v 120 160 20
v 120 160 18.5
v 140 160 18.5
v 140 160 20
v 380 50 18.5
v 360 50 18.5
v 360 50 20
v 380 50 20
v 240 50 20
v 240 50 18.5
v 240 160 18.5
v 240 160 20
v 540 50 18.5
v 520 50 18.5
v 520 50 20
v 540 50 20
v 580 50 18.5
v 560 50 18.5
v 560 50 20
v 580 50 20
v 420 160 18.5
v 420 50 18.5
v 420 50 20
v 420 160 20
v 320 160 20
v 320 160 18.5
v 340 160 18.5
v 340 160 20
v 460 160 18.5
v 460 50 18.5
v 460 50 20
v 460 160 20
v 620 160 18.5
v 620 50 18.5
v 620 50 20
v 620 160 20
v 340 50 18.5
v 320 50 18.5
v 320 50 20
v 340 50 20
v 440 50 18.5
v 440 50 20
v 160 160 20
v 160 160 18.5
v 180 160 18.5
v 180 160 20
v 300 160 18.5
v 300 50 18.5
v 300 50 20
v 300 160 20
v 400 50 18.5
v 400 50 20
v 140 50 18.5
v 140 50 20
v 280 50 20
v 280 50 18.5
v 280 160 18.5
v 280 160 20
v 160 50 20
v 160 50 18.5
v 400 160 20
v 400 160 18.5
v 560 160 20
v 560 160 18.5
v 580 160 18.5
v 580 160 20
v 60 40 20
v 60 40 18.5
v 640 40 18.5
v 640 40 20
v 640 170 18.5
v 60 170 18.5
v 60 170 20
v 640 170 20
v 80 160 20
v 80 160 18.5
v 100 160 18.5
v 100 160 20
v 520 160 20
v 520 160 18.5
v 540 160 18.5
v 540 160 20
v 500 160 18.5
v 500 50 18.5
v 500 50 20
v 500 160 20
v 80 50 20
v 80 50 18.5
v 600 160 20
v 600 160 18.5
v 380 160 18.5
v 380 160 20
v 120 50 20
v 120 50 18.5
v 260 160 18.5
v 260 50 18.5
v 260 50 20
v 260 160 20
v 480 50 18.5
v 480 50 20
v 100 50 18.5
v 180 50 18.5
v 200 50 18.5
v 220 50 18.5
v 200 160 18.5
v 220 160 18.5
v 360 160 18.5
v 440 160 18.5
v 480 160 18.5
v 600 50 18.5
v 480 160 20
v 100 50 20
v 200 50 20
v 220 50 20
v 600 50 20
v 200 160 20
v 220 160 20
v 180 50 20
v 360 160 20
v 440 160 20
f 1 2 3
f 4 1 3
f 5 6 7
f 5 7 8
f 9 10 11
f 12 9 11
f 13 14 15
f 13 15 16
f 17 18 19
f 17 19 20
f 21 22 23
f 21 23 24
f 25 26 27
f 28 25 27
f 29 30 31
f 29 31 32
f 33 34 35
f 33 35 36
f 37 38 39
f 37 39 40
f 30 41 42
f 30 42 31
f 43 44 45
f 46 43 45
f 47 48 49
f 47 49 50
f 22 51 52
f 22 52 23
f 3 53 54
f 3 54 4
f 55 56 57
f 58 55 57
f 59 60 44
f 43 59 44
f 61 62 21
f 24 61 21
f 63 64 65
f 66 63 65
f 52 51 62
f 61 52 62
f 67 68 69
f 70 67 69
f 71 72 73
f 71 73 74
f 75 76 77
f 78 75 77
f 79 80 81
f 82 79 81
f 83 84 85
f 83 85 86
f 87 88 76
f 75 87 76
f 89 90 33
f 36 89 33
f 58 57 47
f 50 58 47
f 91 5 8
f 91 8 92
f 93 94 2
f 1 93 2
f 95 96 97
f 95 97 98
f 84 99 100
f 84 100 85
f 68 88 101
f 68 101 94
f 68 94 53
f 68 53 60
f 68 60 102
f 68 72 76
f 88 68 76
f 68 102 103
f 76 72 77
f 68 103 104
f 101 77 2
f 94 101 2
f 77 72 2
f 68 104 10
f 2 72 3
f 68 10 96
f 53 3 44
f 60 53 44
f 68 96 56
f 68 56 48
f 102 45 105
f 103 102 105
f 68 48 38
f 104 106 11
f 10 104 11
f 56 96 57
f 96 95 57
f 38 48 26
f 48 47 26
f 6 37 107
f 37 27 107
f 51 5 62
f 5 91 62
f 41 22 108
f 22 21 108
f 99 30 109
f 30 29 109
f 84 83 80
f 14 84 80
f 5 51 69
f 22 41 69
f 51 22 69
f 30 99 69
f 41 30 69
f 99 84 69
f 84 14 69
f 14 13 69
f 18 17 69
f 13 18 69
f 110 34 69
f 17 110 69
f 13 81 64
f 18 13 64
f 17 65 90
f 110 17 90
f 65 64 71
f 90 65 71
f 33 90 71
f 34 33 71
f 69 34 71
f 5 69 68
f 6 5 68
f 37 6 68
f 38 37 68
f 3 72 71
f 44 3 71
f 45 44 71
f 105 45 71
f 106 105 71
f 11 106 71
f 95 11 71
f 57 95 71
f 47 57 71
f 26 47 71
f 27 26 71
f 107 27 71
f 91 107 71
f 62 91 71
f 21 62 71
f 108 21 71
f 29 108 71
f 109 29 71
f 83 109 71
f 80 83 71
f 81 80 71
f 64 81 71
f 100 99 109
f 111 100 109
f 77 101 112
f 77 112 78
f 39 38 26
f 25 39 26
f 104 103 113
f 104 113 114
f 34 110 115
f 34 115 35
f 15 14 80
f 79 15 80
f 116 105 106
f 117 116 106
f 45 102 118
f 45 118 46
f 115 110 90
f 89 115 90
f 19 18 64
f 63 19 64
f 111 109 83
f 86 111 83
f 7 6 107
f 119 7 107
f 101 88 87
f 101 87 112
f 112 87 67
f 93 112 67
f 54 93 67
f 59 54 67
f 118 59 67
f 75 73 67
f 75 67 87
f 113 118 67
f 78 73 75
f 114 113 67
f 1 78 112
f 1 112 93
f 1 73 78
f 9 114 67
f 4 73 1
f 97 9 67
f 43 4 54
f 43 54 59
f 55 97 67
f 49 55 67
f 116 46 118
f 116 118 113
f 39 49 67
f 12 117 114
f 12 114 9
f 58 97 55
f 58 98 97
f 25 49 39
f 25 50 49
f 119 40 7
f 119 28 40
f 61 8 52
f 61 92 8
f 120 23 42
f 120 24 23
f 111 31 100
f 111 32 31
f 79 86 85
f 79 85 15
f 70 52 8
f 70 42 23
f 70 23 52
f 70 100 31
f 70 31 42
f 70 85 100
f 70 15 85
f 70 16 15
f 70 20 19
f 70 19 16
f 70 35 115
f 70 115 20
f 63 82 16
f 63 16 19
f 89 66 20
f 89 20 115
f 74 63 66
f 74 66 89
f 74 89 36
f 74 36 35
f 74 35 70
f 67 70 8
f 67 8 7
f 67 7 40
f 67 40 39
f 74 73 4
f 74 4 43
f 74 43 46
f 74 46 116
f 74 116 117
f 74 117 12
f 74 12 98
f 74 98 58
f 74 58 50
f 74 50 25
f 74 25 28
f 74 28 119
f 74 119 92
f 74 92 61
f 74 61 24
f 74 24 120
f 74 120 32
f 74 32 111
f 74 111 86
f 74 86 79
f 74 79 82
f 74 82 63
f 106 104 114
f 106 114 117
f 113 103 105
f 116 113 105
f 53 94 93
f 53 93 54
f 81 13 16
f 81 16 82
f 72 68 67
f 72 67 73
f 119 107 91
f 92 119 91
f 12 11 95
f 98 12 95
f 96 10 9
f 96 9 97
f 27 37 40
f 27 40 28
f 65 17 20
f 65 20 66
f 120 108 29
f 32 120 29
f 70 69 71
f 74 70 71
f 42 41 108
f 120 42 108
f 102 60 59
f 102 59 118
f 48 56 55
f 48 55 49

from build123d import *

# Parameters (mm, degrees)
TOPPING_PLINT_IZGARA_PANELI_1_START  = 18.5
SKETCH1_W                            = 580
SKETCH1_H                            = 130
TOPPING_PLINT_IZGARA_PANELI_1_DEPTH  = 1.5
TOPPING_PLINT_IZGARA_PANELI_2_START  = 17
SKETCH2_W                            = 20
SKETCH2_H                            = 110
TOPPING_PLINT_IZGARA_PANELI_2_DEPTH  = 4
TOPPING_PLINT_IZGARA_PANELI_3_START  = 17
SKETCH3_W                            = 20
SKETCH3_H                            = 110
TOPPING_PLINT_IZGARA_PANELI_3_DEPTH  = 4
TOPPING_PLINT_IZGARA_PANELI_4_START  = 17
SKETCH4_W                            = 20
SKETCH4_H                            = 110
TOPPING_PLINT_IZGARA_PANELI_4_DEPTH  = 4
TOPPING_PLINT_IZGARA_PANELI_5_START  = 17
SKETCH5_W                            = 20
SKETCH5_H                            = 110
TOPPING_PLINT_IZGARA_PANELI_5_DEPTH  = 4
TOPPING_PLINT_IZGARA_PANELI_6_START  = 17
SKETCH6_W                            = 20
SKETCH6_H                            = 110
TOPPING_PLINT_IZGARA_PANELI_6_DEPTH  = 4
TOPPING_PLINT_IZGARA_PANELI_7_START  = 17
SKETCH7_W                            = 20
SKETCH7_H                            = 110
TOPPING_PLINT_IZGARA_PANELI_7_DEPTH  = 4
TOPPING_PLINT_IZGARA_PANELI_8_START  = 17
SKETCH8_W                            = 20
SKETCH8_H                            = 110
TOPPING_PLINT_IZGARA_PANELI_8_DEPTH  = 4
TOPPING_PLINT_IZGARA_PANELI_9_START  = 17
SKETCH9_W                            = 20
SKETCH9_H                            = 110
TOPPING_PLINT_IZGARA_PANELI_9_DEPTH  = 4
TOPPING_PLINT_IZGARA_PANELI_10_START = 17
SKETCH10_W                           = 20
SKETCH10_H                           = 110
TOPPING_PLINT_IZGARA_PANELI_10_DEPTH = 4
TOPPING_PLINT_IZGARA_PANELI_11_START = 17
SKETCH11_W                           = 20
SKETCH11_H                           = 110
TOPPING_PLINT_IZGARA_PANELI_11_DEPTH = 4
TOPPING_PLINT_IZGARA_PANELI_12_START = 17
SKETCH12_W                           = 20
SKETCH12_H                           = 110
TOPPING_PLINT_IZGARA_PANELI_12_DEPTH = 4
TOPPING_PLINT_IZGARA_PANELI_13_START = 17
SKETCH13_W                           = 20
SKETCH13_H                           = 110
TOPPING_PLINT_IZGARA_PANELI_13_DEPTH = 4
TOPPING_PLINT_IZGARA_PANELI_14_START = 17
SKETCH14_W                           = 20
SKETCH14_H                           = 110
TOPPING_PLINT_IZGARA_PANELI_14_DEPTH = 4
TOPPING_PLINT_IZGARA_PANELI_15_START = 17
SKETCH15_W                           = 20
SKETCH15_H                           = 110
TOPPING_PLINT_IZGARA_PANELI_15_DEPTH = 4


with BuildPart() as part:
    # Sketch1 → TOPPING_plint_izgara_paneli_1 (new body)
    with BuildSketch(Plane.XY.offset(TOPPING_PLINT_IZGARA_PANELI_1_START)):
        with Locations((350, 105)):
            Rectangle(SKETCH1_W, SKETCH1_H)
    extrude(amount=TOPPING_PLINT_IZGARA_PANELI_1_DEPTH)

    # Sketch2 → TOPPING_plint_izgara_paneli_2 (cut)
    with BuildSketch(Plane.XY.offset(TOPPING_PLINT_IZGARA_PANELI_2_START)):
        with Locations((90, 105)):
            Rectangle(SKETCH2_W, SKETCH2_H)
    extrude(amount=TOPPING_PLINT_IZGARA_PANELI_2_DEPTH, mode=Mode.SUBTRACT)

    # Sketch3 → TOPPING_plint_izgara_paneli_3 (cut)
    with BuildSketch(Plane.XY.offset(TOPPING_PLINT_IZGARA_PANELI_3_START)):
        with Locations((130, 105)):
            Rectangle(SKETCH3_W, SKETCH3_H)
    extrude(amount=TOPPING_PLINT_IZGARA_PANELI_3_DEPTH, mode=Mode.SUBTRACT)

    # Sketch4 → TOPPING_plint_izgara_paneli_4 (cut)
    with BuildSketch(Plane.XY.offset(TOPPING_PLINT_IZGARA_PANELI_4_START)):
        with Locations((170, 105)):
            Rectangle(SKETCH4_W, SKETCH4_H)
    extrude(amount=TOPPING_PLINT_IZGARA_PANELI_4_DEPTH, mode=Mode.SUBTRACT)

    # Sketch5 → TOPPING_plint_izgara_paneli_5 (cut)
    with BuildSketch(Plane.XY.offset(TOPPING_PLINT_IZGARA_PANELI_5_START)):
        with Locations((210, 105)):
            Rectangle(SKETCH5_W, SKETCH5_H)
    extrude(amount=TOPPING_PLINT_IZGARA_PANELI_5_DEPTH, mode=Mode.SUBTRACT)

    # Sketch6 → TOPPING_plint_izgara_paneli_6 (cut)
    with BuildSketch(Plane.XY.offset(TOPPING_PLINT_IZGARA_PANELI_6_START)):
        with Locations((250, 105)):
            Rectangle(SKETCH6_W, SKETCH6_H)
    extrude(amount=TOPPING_PLINT_IZGARA_PANELI_6_DEPTH, mode=Mode.SUBTRACT)

    # Sketch7 → TOPPING_plint_izgara_paneli_7 (cut)
    with BuildSketch(Plane.XY.offset(TOPPING_PLINT_IZGARA_PANELI_7_START)):
        with Locations((290, 105)):
            Rectangle(SKETCH7_W, SKETCH7_H)
    extrude(amount=TOPPING_PLINT_IZGARA_PANELI_7_DEPTH, mode=Mode.SUBTRACT)

    # Sketch8 → TOPPING_plint_izgara_paneli_8 (cut)
    with BuildSketch(Plane.XY.offset(TOPPING_PLINT_IZGARA_PANELI_8_START)):
        with Locations((330, 105)):
            Rectangle(SKETCH8_W, SKETCH8_H)
    extrude(amount=TOPPING_PLINT_IZGARA_PANELI_8_DEPTH, mode=Mode.SUBTRACT)

    # Sketch9 → TOPPING_plint_izgara_paneli_9 (cut)
    with BuildSketch(Plane.XY.offset(TOPPING_PLINT_IZGARA_PANELI_9_START)):
        with Locations((370, 105)):
            Rectangle(SKETCH9_W, SKETCH9_H)
    extrude(amount=TOPPING_PLINT_IZGARA_PANELI_9_DEPTH, mode=Mode.SUBTRACT)

    # Sketch10 → TOPPING_plint_izgara_paneli_10 (cut)
    with BuildSketch(Plane.XY.offset(TOPPING_PLINT_IZGARA_PANELI_10_START)):
        with Locations((410, 105)):
            Rectangle(SKETCH10_W, SKETCH10_H)
    extrude(amount=TOPPING_PLINT_IZGARA_PANELI_10_DEPTH, mode=Mode.SUBTRACT)

    # Sketch11 → TOPPING_plint_izgara_paneli_11 (cut)
    with BuildSketch(Plane.XY.offset(TOPPING_PLINT_IZGARA_PANELI_11_START)):
        with Locations((450, 105)):
            Rectangle(SKETCH11_W, SKETCH11_H)
    extrude(amount=TOPPING_PLINT_IZGARA_PANELI_11_DEPTH, mode=Mode.SUBTRACT)

    # Sketch12 → TOPPING_plint_izgara_paneli_12 (cut)
    with BuildSketch(Plane.XY.offset(TOPPING_PLINT_IZGARA_PANELI_12_START)):
        with Locations((490, 105)):
            Rectangle(SKETCH12_W, SKETCH12_H)
    extrude(amount=TOPPING_PLINT_IZGARA_PANELI_12_DEPTH, mode=Mode.SUBTRACT)

    # Sketch13 → TOPPING_plint_izgara_paneli_13 (cut)
    with BuildSketch(Plane.XY.offset(TOPPING_PLINT_IZGARA_PANELI_13_START)):
        with Locations((530, 105)):
            Rectangle(SKETCH13_W, SKETCH13_H)
    extrude(amount=TOPPING_PLINT_IZGARA_PANELI_13_DEPTH, mode=Mode.SUBTRACT)

    # Sketch14 → TOPPING_plint_izgara_paneli_14 (cut)
    with BuildSketch(Plane.XY.offset(TOPPING_PLINT_IZGARA_PANELI_14_START)):
        with Locations((570, 105)):
            Rectangle(SKETCH14_W, SKETCH14_H)
    extrude(amount=TOPPING_PLINT_IZGARA_PANELI_14_DEPTH, mode=Mode.SUBTRACT)

    # Sketch15 → TOPPING_plint_izgara_paneli_15 (cut)
    with BuildSketch(Plane.XY.offset(TOPPING_PLINT_IZGARA_PANELI_15_START)):
        with Locations((610, 105)):
            Rectangle(SKETCH15_W, SKETCH15_H)
    extrude(amount=TOPPING_PLINT_IZGARA_PANELI_15_DEPTH, mode=Mode.SUBTRACT)


solid = part.part
